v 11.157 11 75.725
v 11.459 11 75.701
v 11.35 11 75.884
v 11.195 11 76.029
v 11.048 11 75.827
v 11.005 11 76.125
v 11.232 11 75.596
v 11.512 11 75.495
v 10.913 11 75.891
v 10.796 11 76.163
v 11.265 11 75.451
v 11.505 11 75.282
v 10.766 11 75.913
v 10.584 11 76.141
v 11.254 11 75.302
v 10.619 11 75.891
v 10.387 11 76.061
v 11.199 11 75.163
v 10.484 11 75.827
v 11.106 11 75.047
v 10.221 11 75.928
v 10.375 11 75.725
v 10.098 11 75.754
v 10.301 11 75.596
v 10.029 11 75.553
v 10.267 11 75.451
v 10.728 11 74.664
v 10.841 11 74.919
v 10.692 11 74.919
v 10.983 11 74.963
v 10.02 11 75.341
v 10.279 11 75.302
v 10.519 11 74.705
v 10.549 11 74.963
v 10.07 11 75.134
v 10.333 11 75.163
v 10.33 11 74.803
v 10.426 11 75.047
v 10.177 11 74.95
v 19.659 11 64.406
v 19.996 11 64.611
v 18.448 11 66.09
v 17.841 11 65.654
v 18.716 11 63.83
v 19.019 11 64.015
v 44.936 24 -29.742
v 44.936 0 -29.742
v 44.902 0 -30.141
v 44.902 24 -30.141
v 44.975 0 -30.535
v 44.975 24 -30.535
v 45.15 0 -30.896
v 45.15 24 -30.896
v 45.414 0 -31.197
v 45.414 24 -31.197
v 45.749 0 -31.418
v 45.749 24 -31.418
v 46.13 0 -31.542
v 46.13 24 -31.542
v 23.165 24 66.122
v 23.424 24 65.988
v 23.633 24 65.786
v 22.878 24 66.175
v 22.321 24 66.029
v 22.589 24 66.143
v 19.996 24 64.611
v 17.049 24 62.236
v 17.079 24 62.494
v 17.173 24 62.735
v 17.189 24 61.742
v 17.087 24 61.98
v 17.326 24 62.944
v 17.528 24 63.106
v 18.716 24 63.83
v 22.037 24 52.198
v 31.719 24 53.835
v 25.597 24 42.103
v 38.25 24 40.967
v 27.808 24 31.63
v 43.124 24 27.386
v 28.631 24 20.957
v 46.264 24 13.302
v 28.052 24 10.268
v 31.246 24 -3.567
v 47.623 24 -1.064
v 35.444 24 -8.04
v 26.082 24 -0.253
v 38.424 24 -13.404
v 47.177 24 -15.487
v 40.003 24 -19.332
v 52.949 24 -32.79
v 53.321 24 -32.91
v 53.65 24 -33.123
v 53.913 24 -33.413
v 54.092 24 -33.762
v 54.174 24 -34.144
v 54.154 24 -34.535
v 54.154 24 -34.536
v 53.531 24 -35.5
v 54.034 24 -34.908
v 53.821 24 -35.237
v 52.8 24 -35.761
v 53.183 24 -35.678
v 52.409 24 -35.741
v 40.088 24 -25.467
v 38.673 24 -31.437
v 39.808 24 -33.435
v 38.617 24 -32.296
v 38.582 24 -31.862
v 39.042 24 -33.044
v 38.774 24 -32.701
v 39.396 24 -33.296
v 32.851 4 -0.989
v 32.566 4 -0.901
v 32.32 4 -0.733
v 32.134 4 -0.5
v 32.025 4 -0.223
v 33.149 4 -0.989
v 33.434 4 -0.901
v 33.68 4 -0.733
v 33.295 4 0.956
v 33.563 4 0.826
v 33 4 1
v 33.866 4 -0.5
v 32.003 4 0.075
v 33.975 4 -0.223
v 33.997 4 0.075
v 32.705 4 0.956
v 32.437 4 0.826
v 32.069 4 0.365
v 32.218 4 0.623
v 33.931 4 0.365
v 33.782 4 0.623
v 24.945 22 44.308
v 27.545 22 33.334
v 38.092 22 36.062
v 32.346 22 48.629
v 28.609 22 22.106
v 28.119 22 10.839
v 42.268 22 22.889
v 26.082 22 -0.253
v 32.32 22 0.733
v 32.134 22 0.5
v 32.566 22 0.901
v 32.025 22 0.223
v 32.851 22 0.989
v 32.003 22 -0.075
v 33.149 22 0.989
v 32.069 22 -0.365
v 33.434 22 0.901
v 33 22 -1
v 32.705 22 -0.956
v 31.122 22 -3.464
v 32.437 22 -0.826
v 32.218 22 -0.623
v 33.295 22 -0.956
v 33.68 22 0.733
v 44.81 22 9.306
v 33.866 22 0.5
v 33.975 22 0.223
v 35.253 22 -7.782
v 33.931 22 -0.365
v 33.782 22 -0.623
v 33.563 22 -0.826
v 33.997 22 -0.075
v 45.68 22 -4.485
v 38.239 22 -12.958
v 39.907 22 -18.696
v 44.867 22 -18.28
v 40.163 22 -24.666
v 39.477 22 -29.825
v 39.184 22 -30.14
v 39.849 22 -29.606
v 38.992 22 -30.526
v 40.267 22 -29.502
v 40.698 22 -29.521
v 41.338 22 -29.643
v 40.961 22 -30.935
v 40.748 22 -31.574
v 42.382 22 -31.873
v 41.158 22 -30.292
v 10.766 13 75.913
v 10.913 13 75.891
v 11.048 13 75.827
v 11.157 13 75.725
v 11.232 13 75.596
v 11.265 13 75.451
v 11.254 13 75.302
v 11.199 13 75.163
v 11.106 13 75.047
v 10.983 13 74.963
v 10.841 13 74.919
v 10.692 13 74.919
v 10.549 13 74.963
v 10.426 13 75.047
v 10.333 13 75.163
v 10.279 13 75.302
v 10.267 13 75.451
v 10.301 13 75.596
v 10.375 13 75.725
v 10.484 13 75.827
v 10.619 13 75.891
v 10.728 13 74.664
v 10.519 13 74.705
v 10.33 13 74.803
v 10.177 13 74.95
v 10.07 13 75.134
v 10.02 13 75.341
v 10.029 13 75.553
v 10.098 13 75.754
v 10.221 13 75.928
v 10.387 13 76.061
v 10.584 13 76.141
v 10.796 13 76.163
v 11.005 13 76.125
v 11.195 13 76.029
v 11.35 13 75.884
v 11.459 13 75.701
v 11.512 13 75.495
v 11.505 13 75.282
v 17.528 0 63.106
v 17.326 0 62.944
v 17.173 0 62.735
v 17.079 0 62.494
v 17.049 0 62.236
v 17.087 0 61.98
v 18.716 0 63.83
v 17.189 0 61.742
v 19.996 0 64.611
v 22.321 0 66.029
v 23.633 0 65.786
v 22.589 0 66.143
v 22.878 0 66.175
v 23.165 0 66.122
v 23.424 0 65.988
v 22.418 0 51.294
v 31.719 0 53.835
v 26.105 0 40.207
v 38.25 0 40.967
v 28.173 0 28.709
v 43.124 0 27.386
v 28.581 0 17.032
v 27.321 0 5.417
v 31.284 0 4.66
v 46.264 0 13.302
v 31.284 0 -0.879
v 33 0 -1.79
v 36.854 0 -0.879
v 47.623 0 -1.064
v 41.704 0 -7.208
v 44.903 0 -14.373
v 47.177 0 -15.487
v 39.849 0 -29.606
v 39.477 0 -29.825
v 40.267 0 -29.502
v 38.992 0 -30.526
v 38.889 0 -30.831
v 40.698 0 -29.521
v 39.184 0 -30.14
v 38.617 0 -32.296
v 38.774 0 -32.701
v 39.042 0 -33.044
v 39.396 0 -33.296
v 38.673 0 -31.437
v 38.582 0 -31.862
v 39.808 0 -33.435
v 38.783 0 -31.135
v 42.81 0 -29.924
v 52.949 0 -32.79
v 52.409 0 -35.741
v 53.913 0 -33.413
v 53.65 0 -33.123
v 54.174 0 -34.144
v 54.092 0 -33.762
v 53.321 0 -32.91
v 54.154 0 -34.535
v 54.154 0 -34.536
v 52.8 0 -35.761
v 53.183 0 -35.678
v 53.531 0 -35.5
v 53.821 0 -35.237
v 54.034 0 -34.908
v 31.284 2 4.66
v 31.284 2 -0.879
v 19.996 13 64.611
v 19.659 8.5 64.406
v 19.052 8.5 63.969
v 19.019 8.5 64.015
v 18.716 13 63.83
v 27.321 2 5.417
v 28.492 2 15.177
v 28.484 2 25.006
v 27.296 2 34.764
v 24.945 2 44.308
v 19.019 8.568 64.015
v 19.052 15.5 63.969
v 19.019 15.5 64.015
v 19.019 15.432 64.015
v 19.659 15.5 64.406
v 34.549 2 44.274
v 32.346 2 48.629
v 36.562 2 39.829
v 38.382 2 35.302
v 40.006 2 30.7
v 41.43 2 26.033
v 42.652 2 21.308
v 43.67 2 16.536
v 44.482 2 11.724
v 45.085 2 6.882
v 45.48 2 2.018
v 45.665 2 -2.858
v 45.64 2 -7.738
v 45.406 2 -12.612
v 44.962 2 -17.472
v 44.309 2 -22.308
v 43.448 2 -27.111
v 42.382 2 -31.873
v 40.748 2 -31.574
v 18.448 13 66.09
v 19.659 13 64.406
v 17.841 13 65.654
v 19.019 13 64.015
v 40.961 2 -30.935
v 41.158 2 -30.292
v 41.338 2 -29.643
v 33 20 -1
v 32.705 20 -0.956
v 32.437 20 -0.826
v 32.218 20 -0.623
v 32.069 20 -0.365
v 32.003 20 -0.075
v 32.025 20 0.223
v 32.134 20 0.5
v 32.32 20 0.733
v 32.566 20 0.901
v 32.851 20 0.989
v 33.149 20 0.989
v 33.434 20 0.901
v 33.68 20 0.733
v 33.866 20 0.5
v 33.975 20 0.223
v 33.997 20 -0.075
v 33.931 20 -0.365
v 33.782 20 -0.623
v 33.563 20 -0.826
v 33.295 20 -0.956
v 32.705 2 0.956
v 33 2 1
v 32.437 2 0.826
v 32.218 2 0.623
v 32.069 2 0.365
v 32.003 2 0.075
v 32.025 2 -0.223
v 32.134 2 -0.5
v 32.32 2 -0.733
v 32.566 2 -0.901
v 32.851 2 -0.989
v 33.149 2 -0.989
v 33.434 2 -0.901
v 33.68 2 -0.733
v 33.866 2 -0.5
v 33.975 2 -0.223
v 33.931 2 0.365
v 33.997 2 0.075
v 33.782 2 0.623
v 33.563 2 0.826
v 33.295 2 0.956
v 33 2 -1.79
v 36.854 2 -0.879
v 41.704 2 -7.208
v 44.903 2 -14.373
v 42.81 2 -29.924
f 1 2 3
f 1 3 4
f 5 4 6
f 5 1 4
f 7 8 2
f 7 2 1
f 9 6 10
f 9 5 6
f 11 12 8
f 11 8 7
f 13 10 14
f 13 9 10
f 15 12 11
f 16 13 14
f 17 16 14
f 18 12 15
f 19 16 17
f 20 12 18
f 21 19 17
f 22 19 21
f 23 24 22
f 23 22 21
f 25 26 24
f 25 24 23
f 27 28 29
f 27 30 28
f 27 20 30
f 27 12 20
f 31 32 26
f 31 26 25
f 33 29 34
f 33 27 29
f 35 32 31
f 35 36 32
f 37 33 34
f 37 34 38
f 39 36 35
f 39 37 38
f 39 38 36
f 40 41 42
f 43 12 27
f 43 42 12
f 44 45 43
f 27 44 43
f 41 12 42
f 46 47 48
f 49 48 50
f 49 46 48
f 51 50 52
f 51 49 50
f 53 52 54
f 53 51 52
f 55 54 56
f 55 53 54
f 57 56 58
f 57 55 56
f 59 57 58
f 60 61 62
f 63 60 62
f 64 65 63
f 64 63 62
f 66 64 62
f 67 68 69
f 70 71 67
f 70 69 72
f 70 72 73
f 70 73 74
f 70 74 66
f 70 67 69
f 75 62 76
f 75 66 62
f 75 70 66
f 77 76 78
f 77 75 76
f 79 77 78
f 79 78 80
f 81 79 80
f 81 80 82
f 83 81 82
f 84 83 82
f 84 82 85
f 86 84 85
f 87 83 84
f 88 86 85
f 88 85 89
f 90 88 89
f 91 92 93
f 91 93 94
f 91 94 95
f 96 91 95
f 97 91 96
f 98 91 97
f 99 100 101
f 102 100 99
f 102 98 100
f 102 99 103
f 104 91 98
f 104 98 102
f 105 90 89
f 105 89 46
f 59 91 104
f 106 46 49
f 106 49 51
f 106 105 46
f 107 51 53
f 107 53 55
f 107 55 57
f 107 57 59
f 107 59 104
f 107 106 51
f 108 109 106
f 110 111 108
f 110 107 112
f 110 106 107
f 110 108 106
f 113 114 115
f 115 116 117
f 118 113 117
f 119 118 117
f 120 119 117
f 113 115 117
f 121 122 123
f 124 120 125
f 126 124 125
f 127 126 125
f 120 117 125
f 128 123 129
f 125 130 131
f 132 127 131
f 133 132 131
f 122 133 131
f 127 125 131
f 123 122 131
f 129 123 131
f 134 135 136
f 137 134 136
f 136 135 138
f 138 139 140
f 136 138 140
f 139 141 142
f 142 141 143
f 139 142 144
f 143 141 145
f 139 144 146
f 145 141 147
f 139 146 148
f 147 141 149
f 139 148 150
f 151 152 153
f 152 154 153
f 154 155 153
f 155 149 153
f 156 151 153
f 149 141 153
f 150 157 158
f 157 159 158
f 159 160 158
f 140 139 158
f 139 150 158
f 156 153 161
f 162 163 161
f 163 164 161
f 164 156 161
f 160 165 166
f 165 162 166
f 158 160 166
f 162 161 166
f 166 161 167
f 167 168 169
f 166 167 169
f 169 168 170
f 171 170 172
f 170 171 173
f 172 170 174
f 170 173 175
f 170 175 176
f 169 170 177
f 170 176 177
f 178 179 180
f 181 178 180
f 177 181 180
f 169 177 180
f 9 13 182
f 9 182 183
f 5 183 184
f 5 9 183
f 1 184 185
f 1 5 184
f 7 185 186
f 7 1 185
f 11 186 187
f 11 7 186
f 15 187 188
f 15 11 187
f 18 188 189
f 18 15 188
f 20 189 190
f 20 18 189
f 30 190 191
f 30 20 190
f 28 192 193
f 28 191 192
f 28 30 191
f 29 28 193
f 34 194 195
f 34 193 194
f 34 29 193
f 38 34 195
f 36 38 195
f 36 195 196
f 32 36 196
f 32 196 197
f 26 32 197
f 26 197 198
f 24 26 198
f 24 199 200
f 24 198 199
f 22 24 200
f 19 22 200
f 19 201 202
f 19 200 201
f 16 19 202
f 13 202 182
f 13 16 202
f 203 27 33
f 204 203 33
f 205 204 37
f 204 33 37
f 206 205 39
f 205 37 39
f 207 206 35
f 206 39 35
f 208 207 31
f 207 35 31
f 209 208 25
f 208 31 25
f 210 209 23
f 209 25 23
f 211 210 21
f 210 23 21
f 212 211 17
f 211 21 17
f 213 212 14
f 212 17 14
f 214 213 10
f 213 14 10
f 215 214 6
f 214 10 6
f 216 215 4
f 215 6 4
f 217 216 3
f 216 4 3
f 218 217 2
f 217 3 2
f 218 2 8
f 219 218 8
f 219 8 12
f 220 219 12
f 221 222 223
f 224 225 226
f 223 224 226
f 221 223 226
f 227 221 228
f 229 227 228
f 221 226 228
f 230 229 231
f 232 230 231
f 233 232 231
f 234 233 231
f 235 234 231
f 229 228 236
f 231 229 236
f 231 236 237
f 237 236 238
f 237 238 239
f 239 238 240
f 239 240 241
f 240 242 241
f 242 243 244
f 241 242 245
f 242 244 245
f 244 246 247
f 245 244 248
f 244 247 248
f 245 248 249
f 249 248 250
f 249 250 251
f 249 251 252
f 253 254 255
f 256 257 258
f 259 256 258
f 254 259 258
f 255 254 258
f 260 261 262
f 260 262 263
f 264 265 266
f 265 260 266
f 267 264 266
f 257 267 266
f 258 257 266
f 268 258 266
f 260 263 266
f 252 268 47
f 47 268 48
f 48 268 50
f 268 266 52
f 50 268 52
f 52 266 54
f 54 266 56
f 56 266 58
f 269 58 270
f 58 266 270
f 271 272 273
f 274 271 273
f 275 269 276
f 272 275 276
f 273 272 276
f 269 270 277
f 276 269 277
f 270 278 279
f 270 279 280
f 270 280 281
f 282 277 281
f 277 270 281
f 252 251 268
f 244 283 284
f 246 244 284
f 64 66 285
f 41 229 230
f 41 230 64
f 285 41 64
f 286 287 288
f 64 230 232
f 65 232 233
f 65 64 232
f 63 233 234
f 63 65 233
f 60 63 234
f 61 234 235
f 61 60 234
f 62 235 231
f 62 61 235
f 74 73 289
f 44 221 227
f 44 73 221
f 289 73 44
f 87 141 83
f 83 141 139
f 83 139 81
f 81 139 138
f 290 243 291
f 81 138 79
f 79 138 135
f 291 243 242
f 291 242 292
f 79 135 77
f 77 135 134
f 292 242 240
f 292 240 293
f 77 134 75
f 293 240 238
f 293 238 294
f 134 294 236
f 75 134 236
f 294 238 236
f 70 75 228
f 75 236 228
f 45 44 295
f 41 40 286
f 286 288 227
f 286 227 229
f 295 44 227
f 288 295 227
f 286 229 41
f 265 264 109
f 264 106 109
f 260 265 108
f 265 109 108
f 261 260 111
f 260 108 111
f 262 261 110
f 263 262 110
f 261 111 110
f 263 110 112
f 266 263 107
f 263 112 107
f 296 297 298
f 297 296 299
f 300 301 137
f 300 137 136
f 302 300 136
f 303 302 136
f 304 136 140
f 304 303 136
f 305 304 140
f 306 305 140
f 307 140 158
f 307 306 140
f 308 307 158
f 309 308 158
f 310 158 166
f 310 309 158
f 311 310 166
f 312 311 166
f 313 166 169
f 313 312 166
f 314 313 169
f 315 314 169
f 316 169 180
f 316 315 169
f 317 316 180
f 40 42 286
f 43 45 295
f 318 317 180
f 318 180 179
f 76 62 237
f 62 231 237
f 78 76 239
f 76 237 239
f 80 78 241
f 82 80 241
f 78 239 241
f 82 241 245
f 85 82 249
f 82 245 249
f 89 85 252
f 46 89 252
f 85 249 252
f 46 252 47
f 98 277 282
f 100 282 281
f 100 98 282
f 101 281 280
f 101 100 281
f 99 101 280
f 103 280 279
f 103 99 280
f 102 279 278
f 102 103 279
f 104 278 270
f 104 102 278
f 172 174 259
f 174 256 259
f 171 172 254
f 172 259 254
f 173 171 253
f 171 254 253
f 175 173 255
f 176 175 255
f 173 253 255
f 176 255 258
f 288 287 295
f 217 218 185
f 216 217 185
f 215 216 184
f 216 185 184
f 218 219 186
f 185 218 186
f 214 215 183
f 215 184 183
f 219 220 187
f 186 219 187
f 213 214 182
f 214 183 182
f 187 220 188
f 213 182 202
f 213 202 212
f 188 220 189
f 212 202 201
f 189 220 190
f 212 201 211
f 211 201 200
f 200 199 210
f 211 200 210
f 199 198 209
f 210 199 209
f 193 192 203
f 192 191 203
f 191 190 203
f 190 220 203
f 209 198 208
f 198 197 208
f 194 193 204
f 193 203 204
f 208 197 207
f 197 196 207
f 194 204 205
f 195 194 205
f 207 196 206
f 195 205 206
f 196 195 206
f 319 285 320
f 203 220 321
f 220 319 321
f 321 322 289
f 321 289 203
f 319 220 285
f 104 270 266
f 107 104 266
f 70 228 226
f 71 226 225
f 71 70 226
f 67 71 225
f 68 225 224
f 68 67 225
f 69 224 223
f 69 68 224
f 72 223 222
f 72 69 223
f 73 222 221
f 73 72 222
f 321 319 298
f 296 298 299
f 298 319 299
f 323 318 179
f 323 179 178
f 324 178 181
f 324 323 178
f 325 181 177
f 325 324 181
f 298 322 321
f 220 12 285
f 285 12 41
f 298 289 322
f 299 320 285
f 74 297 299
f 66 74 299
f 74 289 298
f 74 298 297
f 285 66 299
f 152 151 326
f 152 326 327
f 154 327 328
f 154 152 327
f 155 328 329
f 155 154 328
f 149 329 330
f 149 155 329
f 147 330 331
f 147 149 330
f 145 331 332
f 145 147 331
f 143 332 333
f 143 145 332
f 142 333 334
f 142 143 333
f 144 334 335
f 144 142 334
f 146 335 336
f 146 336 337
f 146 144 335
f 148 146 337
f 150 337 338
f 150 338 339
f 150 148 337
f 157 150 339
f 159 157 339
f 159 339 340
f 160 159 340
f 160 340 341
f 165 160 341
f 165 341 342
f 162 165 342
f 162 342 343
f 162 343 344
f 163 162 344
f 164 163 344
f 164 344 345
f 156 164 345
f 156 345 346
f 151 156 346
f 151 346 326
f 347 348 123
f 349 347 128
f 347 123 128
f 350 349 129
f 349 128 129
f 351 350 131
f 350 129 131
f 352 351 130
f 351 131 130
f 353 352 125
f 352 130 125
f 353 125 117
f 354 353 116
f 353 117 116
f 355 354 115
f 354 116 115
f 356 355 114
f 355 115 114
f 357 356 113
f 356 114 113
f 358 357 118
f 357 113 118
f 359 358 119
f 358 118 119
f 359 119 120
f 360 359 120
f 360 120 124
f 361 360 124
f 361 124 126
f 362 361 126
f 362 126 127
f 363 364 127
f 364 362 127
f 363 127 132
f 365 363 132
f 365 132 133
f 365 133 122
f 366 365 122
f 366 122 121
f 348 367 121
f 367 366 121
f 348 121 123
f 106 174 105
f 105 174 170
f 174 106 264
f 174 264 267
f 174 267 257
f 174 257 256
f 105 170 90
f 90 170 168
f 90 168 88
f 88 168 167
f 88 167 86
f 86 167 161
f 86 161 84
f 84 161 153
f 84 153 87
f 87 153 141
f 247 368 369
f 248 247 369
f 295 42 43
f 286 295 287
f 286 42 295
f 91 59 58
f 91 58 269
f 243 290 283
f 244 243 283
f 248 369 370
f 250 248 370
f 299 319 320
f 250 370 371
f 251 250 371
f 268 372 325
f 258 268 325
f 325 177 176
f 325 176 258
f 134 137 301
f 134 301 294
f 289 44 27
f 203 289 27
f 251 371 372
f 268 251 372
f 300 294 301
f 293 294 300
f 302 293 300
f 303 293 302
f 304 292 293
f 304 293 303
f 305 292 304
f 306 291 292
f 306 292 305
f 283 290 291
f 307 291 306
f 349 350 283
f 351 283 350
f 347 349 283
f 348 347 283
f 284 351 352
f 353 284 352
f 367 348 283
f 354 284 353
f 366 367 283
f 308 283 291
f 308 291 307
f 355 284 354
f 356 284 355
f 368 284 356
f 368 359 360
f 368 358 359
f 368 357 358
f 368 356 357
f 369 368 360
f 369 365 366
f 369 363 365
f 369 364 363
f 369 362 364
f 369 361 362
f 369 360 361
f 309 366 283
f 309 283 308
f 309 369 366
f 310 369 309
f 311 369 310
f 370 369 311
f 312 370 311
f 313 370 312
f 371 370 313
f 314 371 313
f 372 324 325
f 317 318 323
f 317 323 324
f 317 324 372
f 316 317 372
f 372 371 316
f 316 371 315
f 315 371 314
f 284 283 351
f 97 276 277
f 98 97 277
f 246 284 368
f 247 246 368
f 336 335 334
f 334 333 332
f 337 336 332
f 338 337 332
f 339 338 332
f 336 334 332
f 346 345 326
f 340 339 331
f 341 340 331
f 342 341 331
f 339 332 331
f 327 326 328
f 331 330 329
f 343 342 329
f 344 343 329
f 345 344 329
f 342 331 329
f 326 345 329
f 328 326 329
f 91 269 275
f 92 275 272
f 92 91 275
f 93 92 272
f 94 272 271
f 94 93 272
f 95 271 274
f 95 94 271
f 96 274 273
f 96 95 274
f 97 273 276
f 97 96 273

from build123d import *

# Parameters (mm, degrees)
BOSS_EXTRUDE4_DEPTH      = 24
SHELL1_T                 = -2
SKETCH9_R                = 1
CUT_EXTRUDE1_DEPTH       = 22
SKETCH6_R                = 1
BOSS_EXTRUDE5_DEPTH      = 4
BOSS_EXTRUDE6_START      = -4
SKETCH8_R                = 1
BOSS_EXTRUDE6_DEPTH      = 4
BOSS_EXTRUDE7_START      = -24
BOSS_EXTRUDE7_DEPTH      = 24
FILLET1_R                = 1
FILLET2_R                = 1.5
SKETCH12_R               = 0.5
BOSS_EXTRUDE8_DEPTH      = 24
CUT_EXTRUDE3_DEPTH       = 11
CUT_EXTRUDE4_DEPTH       = 11
BOSS_EXTRUDE9_DEPTH      = 2.5
BOSS_EXTRUDE9_DEPTH_BACK = 4.5
CUT_EXTRUDE5_DEPTH       = 0.747850193


with BuildPart() as part:
    # Sketch5 → Boss-Extrude4 (new body)
    with BuildSketch(Plane(origin=(0, 0, 0), x_dir=(1, 0, 0), z_dir=(0, 1, 0))):
        with BuildLine():
            Line((16.679736529, -62.588474268), (23.082859001, -66.493602001))
            ThreePointArc((23.082859001, -66.493602001), (44.985866831, -20.069862482), (44.587534446, 31.259921018))
            Line((44.587534446, 31.259921018), (54.42418125, 33.060026475))
            Line((54.42418125, 33.060026475), (53.884149613, 36.011020517))
            Line((53.884149613, 36.011020517), (37.98404912, 33.101303594))
            ThreePointArc((37.98404912, 33.101303594), (38.745638884, 14.245000299), (26.08183659, 0.253277589))
            ThreePointArc((26.08183659, 0.253277589), (27.736010667, -32.118438365), (16.679736529, -62.588474268))
        make_face()
    extrude(amount=BOSS_EXTRUDE4_DEPTH)

    # Shell1
    shell1_openings = [part.faces().sort_by_distance(p)[0] for p in [
        (27.736010667, 12, 32.118438365),
    ]]
    offset(amount=SHELL1_T, openings=shell1_openings, kind=Kind.INTERSECTION)

    # Sketch9 → Cut-Extrude1 (cut)
    with BuildSketch(Plane(origin=(0, 22, 0), x_dir=(-1, 0, 0), z_dir=(0, -1, 0))):
        with Locations(Location((-33, 0, 0), (0, 0, 90))):
            Circle(SKETCH9_R)
        Polygon((-18.802526646, -7.044160924), (-31.283524546, -4.66015009), (-31.283524546, 0.878893836), (-33, 1.78957842), (-36.853763417, 0.878893836), (-41.704444312, 7.207877481), (-44.902710544, 14.373324664), (-42.809869411, 29.924231084), (-24.798121137, 26.483784785), align=None)
    extrude(amount=CUT_EXTRUDE1_DEPTH, mode=Mode.SUBTRACT)

    # Sketch6 → Boss-Extrude5 (add)
    with BuildSketch(Plane(origin=(0, 24, 0), x_dir=(1, 0, 0), z_dir=(0, 1, 0))):
        with Locations(Location((33, 0, 0), (0, 0, 90))):
            Circle(SKETCH6_R)
    extrude(amount=-BOSS_EXTRUDE5_DEPTH)

    # Sketch8 → Boss-Extrude6 (add)
    with BuildSketch(Plane(origin=(0, 0, 0), x_dir=(-1, 0, 0), z_dir=(0, -1, 0)).offset(BOSS_EXTRUDE6_START)):
        with Locations(Location((-33, 0, 0), (0, 0, 270))):
            Circle(SKETCH8_R)
    extrude(amount=BOSS_EXTRUDE6_DEPTH)

    # Sketch11 → Boss-Extrude7 (add)
    with BuildSketch(Plane(origin=(0, 24, 0), x_dir=(1, 0, 0), z_dir=(0, 1, 0)).offset(BOSS_EXTRUDE7_START)):
        with BuildLine():
            Line((16.679736529, -62.588474268), (23.082859001, -66.493602001))
            ThreePointArc((23.082859001, -66.493602001), (28.946672892, -58.305690928), (34.074211637, -49.637672267))
            Line((34.074211637, -49.637672267), (24.945218618, -44.308006728))
            ThreePointArc((24.945218618, -44.308006728), (21.37536937, -53.70275106), (16.679736529, -62.588474268))
        make_face()
    extrude(amount=BOSS_EXTRUDE7_DEPTH)

    # Fillet1
    fillet1_edges = [part.edges().sort_by_distance(p)[0] for p in [
        (23.082859001, 12, 66.493602001),
        (16.679736529, 12, 62.588474268),
    ]]
    fillet(fillet1_edges, radius=FILLET1_R)

    # Fillet2
    fillet2_edges = [part.edges().sort_by_distance(p)[0] for p in [
        (39.36869634, 11, -29.266928363),
        (37.98404912, 12, -33.101303594),
        (53.884149613, 12, -36.011020517),
        (54.42418125, 12, -33.060026475),
        (44.587534446, 12, -31.259921018),
    ]]
    fillet(fillet2_edges, radius=FILLET2_R - 0.0001)  # a hair under: the kernel refuses the full size

    # Sketch12 → Boss-Extrude8 (add)
    with BuildSketch(Plane(origin=(0, 0, 0), x_dir=(1, 0, 0), z_dir=(0, 1, 0))):
        with BuildLine():
            Line((18.715601118, -63.830104629), (10.728103117, -74.664444727))
            ThreePointArc((10.728103117, -74.664444727), (10.299090631, -76.000345168), (11.504530989, -75.282295557))
            Line((11.504530989, -75.282295557), (19.996225612, -64.611130176))
            Line((19.996225612, -64.611130176), (18.715601118, -63.830104629))
        make_face()
        with Locations(Location((10.766093359, -75.413481937, 0), (0, 0, 270))):
            Circle(SKETCH12_R, mode=Mode.SUBTRACT)
    extrude(amount=BOSS_EXTRUDE8_DEPTH)

    # Sketch13 → Cut-Extrude3 (cut)
    with BuildSketch(Plane(origin=(0, 0, 0), x_dir=(1, 0, 0), z_dir=(0, 1, 0))):
        Polygon((19.996225612, -64.611130176), (24.885458438, -67.592968924), (14.482058763, -80.670297518), (6.551415536, -74.361237485), (17.528327491, -63.106011785), align=None)
    extrude(amount=CUT_EXTRUDE3_DEPTH, mode=Mode.SUBTRACT)

    # Sketch14 → Cut-Extrude4 (cut)
    with BuildSketch(Plane(origin=(0, 24, 0), x_dir=(1, 0, 0), z_dir=(0, 1, 0))):
        Polygon((19.996225612, -64.611130176), (15.918276164, -82.297397679), (4.930036713, -72.505157079), (18.705017469, -63.823649888), align=None)
    extrude(amount=-CUT_EXTRUDE4_DEPTH, mode=Mode.SUBTRACT)

    # Sketch15 → Boss-Extrude9 (add, two sides: drawn at the far end of the back side and taken through both)
    with BuildSketch(Plane(origin=(0, 13, 0), x_dir=(1, 0, 0), z_dir=(0, 1, 0)).offset(-BOSS_EXTRUDE9_DEPTH_BACK)):
        Polygon((19.018790552, -64.015013394), (17.840516782, -65.653708569), (18.447701563, -66.090293672), (19.659102799, -64.405526167), align=None)
    extrude(amount=BOSS_EXTRUDE9_DEPTH + BOSS_EXTRUDE9_DEPTH_BACK)

    # Sketch16 → Cut-Extrude5 (cut)
    with BuildSketch(Plane(origin=(43.486111653, 0, 31.267892586), x_dir=(0.5837868426462293, 0, -0.8119069665627625), z_dir=(0.8119069665627625, 0, 0.5837868426462293))):
        Polygon((-42.889644405, 13), (-40.814569828, 15.5), (-42.889644405, 15.5), align=None)
        Polygon((-42.889644405, 11), (-40.814569828, 8.5), (-42.889644405, 8.5), align=None)
    extrude(amount=-CUT_EXTRUDE5_DEPTH, mode=Mode.SUBTRACT)


solid = part.part
